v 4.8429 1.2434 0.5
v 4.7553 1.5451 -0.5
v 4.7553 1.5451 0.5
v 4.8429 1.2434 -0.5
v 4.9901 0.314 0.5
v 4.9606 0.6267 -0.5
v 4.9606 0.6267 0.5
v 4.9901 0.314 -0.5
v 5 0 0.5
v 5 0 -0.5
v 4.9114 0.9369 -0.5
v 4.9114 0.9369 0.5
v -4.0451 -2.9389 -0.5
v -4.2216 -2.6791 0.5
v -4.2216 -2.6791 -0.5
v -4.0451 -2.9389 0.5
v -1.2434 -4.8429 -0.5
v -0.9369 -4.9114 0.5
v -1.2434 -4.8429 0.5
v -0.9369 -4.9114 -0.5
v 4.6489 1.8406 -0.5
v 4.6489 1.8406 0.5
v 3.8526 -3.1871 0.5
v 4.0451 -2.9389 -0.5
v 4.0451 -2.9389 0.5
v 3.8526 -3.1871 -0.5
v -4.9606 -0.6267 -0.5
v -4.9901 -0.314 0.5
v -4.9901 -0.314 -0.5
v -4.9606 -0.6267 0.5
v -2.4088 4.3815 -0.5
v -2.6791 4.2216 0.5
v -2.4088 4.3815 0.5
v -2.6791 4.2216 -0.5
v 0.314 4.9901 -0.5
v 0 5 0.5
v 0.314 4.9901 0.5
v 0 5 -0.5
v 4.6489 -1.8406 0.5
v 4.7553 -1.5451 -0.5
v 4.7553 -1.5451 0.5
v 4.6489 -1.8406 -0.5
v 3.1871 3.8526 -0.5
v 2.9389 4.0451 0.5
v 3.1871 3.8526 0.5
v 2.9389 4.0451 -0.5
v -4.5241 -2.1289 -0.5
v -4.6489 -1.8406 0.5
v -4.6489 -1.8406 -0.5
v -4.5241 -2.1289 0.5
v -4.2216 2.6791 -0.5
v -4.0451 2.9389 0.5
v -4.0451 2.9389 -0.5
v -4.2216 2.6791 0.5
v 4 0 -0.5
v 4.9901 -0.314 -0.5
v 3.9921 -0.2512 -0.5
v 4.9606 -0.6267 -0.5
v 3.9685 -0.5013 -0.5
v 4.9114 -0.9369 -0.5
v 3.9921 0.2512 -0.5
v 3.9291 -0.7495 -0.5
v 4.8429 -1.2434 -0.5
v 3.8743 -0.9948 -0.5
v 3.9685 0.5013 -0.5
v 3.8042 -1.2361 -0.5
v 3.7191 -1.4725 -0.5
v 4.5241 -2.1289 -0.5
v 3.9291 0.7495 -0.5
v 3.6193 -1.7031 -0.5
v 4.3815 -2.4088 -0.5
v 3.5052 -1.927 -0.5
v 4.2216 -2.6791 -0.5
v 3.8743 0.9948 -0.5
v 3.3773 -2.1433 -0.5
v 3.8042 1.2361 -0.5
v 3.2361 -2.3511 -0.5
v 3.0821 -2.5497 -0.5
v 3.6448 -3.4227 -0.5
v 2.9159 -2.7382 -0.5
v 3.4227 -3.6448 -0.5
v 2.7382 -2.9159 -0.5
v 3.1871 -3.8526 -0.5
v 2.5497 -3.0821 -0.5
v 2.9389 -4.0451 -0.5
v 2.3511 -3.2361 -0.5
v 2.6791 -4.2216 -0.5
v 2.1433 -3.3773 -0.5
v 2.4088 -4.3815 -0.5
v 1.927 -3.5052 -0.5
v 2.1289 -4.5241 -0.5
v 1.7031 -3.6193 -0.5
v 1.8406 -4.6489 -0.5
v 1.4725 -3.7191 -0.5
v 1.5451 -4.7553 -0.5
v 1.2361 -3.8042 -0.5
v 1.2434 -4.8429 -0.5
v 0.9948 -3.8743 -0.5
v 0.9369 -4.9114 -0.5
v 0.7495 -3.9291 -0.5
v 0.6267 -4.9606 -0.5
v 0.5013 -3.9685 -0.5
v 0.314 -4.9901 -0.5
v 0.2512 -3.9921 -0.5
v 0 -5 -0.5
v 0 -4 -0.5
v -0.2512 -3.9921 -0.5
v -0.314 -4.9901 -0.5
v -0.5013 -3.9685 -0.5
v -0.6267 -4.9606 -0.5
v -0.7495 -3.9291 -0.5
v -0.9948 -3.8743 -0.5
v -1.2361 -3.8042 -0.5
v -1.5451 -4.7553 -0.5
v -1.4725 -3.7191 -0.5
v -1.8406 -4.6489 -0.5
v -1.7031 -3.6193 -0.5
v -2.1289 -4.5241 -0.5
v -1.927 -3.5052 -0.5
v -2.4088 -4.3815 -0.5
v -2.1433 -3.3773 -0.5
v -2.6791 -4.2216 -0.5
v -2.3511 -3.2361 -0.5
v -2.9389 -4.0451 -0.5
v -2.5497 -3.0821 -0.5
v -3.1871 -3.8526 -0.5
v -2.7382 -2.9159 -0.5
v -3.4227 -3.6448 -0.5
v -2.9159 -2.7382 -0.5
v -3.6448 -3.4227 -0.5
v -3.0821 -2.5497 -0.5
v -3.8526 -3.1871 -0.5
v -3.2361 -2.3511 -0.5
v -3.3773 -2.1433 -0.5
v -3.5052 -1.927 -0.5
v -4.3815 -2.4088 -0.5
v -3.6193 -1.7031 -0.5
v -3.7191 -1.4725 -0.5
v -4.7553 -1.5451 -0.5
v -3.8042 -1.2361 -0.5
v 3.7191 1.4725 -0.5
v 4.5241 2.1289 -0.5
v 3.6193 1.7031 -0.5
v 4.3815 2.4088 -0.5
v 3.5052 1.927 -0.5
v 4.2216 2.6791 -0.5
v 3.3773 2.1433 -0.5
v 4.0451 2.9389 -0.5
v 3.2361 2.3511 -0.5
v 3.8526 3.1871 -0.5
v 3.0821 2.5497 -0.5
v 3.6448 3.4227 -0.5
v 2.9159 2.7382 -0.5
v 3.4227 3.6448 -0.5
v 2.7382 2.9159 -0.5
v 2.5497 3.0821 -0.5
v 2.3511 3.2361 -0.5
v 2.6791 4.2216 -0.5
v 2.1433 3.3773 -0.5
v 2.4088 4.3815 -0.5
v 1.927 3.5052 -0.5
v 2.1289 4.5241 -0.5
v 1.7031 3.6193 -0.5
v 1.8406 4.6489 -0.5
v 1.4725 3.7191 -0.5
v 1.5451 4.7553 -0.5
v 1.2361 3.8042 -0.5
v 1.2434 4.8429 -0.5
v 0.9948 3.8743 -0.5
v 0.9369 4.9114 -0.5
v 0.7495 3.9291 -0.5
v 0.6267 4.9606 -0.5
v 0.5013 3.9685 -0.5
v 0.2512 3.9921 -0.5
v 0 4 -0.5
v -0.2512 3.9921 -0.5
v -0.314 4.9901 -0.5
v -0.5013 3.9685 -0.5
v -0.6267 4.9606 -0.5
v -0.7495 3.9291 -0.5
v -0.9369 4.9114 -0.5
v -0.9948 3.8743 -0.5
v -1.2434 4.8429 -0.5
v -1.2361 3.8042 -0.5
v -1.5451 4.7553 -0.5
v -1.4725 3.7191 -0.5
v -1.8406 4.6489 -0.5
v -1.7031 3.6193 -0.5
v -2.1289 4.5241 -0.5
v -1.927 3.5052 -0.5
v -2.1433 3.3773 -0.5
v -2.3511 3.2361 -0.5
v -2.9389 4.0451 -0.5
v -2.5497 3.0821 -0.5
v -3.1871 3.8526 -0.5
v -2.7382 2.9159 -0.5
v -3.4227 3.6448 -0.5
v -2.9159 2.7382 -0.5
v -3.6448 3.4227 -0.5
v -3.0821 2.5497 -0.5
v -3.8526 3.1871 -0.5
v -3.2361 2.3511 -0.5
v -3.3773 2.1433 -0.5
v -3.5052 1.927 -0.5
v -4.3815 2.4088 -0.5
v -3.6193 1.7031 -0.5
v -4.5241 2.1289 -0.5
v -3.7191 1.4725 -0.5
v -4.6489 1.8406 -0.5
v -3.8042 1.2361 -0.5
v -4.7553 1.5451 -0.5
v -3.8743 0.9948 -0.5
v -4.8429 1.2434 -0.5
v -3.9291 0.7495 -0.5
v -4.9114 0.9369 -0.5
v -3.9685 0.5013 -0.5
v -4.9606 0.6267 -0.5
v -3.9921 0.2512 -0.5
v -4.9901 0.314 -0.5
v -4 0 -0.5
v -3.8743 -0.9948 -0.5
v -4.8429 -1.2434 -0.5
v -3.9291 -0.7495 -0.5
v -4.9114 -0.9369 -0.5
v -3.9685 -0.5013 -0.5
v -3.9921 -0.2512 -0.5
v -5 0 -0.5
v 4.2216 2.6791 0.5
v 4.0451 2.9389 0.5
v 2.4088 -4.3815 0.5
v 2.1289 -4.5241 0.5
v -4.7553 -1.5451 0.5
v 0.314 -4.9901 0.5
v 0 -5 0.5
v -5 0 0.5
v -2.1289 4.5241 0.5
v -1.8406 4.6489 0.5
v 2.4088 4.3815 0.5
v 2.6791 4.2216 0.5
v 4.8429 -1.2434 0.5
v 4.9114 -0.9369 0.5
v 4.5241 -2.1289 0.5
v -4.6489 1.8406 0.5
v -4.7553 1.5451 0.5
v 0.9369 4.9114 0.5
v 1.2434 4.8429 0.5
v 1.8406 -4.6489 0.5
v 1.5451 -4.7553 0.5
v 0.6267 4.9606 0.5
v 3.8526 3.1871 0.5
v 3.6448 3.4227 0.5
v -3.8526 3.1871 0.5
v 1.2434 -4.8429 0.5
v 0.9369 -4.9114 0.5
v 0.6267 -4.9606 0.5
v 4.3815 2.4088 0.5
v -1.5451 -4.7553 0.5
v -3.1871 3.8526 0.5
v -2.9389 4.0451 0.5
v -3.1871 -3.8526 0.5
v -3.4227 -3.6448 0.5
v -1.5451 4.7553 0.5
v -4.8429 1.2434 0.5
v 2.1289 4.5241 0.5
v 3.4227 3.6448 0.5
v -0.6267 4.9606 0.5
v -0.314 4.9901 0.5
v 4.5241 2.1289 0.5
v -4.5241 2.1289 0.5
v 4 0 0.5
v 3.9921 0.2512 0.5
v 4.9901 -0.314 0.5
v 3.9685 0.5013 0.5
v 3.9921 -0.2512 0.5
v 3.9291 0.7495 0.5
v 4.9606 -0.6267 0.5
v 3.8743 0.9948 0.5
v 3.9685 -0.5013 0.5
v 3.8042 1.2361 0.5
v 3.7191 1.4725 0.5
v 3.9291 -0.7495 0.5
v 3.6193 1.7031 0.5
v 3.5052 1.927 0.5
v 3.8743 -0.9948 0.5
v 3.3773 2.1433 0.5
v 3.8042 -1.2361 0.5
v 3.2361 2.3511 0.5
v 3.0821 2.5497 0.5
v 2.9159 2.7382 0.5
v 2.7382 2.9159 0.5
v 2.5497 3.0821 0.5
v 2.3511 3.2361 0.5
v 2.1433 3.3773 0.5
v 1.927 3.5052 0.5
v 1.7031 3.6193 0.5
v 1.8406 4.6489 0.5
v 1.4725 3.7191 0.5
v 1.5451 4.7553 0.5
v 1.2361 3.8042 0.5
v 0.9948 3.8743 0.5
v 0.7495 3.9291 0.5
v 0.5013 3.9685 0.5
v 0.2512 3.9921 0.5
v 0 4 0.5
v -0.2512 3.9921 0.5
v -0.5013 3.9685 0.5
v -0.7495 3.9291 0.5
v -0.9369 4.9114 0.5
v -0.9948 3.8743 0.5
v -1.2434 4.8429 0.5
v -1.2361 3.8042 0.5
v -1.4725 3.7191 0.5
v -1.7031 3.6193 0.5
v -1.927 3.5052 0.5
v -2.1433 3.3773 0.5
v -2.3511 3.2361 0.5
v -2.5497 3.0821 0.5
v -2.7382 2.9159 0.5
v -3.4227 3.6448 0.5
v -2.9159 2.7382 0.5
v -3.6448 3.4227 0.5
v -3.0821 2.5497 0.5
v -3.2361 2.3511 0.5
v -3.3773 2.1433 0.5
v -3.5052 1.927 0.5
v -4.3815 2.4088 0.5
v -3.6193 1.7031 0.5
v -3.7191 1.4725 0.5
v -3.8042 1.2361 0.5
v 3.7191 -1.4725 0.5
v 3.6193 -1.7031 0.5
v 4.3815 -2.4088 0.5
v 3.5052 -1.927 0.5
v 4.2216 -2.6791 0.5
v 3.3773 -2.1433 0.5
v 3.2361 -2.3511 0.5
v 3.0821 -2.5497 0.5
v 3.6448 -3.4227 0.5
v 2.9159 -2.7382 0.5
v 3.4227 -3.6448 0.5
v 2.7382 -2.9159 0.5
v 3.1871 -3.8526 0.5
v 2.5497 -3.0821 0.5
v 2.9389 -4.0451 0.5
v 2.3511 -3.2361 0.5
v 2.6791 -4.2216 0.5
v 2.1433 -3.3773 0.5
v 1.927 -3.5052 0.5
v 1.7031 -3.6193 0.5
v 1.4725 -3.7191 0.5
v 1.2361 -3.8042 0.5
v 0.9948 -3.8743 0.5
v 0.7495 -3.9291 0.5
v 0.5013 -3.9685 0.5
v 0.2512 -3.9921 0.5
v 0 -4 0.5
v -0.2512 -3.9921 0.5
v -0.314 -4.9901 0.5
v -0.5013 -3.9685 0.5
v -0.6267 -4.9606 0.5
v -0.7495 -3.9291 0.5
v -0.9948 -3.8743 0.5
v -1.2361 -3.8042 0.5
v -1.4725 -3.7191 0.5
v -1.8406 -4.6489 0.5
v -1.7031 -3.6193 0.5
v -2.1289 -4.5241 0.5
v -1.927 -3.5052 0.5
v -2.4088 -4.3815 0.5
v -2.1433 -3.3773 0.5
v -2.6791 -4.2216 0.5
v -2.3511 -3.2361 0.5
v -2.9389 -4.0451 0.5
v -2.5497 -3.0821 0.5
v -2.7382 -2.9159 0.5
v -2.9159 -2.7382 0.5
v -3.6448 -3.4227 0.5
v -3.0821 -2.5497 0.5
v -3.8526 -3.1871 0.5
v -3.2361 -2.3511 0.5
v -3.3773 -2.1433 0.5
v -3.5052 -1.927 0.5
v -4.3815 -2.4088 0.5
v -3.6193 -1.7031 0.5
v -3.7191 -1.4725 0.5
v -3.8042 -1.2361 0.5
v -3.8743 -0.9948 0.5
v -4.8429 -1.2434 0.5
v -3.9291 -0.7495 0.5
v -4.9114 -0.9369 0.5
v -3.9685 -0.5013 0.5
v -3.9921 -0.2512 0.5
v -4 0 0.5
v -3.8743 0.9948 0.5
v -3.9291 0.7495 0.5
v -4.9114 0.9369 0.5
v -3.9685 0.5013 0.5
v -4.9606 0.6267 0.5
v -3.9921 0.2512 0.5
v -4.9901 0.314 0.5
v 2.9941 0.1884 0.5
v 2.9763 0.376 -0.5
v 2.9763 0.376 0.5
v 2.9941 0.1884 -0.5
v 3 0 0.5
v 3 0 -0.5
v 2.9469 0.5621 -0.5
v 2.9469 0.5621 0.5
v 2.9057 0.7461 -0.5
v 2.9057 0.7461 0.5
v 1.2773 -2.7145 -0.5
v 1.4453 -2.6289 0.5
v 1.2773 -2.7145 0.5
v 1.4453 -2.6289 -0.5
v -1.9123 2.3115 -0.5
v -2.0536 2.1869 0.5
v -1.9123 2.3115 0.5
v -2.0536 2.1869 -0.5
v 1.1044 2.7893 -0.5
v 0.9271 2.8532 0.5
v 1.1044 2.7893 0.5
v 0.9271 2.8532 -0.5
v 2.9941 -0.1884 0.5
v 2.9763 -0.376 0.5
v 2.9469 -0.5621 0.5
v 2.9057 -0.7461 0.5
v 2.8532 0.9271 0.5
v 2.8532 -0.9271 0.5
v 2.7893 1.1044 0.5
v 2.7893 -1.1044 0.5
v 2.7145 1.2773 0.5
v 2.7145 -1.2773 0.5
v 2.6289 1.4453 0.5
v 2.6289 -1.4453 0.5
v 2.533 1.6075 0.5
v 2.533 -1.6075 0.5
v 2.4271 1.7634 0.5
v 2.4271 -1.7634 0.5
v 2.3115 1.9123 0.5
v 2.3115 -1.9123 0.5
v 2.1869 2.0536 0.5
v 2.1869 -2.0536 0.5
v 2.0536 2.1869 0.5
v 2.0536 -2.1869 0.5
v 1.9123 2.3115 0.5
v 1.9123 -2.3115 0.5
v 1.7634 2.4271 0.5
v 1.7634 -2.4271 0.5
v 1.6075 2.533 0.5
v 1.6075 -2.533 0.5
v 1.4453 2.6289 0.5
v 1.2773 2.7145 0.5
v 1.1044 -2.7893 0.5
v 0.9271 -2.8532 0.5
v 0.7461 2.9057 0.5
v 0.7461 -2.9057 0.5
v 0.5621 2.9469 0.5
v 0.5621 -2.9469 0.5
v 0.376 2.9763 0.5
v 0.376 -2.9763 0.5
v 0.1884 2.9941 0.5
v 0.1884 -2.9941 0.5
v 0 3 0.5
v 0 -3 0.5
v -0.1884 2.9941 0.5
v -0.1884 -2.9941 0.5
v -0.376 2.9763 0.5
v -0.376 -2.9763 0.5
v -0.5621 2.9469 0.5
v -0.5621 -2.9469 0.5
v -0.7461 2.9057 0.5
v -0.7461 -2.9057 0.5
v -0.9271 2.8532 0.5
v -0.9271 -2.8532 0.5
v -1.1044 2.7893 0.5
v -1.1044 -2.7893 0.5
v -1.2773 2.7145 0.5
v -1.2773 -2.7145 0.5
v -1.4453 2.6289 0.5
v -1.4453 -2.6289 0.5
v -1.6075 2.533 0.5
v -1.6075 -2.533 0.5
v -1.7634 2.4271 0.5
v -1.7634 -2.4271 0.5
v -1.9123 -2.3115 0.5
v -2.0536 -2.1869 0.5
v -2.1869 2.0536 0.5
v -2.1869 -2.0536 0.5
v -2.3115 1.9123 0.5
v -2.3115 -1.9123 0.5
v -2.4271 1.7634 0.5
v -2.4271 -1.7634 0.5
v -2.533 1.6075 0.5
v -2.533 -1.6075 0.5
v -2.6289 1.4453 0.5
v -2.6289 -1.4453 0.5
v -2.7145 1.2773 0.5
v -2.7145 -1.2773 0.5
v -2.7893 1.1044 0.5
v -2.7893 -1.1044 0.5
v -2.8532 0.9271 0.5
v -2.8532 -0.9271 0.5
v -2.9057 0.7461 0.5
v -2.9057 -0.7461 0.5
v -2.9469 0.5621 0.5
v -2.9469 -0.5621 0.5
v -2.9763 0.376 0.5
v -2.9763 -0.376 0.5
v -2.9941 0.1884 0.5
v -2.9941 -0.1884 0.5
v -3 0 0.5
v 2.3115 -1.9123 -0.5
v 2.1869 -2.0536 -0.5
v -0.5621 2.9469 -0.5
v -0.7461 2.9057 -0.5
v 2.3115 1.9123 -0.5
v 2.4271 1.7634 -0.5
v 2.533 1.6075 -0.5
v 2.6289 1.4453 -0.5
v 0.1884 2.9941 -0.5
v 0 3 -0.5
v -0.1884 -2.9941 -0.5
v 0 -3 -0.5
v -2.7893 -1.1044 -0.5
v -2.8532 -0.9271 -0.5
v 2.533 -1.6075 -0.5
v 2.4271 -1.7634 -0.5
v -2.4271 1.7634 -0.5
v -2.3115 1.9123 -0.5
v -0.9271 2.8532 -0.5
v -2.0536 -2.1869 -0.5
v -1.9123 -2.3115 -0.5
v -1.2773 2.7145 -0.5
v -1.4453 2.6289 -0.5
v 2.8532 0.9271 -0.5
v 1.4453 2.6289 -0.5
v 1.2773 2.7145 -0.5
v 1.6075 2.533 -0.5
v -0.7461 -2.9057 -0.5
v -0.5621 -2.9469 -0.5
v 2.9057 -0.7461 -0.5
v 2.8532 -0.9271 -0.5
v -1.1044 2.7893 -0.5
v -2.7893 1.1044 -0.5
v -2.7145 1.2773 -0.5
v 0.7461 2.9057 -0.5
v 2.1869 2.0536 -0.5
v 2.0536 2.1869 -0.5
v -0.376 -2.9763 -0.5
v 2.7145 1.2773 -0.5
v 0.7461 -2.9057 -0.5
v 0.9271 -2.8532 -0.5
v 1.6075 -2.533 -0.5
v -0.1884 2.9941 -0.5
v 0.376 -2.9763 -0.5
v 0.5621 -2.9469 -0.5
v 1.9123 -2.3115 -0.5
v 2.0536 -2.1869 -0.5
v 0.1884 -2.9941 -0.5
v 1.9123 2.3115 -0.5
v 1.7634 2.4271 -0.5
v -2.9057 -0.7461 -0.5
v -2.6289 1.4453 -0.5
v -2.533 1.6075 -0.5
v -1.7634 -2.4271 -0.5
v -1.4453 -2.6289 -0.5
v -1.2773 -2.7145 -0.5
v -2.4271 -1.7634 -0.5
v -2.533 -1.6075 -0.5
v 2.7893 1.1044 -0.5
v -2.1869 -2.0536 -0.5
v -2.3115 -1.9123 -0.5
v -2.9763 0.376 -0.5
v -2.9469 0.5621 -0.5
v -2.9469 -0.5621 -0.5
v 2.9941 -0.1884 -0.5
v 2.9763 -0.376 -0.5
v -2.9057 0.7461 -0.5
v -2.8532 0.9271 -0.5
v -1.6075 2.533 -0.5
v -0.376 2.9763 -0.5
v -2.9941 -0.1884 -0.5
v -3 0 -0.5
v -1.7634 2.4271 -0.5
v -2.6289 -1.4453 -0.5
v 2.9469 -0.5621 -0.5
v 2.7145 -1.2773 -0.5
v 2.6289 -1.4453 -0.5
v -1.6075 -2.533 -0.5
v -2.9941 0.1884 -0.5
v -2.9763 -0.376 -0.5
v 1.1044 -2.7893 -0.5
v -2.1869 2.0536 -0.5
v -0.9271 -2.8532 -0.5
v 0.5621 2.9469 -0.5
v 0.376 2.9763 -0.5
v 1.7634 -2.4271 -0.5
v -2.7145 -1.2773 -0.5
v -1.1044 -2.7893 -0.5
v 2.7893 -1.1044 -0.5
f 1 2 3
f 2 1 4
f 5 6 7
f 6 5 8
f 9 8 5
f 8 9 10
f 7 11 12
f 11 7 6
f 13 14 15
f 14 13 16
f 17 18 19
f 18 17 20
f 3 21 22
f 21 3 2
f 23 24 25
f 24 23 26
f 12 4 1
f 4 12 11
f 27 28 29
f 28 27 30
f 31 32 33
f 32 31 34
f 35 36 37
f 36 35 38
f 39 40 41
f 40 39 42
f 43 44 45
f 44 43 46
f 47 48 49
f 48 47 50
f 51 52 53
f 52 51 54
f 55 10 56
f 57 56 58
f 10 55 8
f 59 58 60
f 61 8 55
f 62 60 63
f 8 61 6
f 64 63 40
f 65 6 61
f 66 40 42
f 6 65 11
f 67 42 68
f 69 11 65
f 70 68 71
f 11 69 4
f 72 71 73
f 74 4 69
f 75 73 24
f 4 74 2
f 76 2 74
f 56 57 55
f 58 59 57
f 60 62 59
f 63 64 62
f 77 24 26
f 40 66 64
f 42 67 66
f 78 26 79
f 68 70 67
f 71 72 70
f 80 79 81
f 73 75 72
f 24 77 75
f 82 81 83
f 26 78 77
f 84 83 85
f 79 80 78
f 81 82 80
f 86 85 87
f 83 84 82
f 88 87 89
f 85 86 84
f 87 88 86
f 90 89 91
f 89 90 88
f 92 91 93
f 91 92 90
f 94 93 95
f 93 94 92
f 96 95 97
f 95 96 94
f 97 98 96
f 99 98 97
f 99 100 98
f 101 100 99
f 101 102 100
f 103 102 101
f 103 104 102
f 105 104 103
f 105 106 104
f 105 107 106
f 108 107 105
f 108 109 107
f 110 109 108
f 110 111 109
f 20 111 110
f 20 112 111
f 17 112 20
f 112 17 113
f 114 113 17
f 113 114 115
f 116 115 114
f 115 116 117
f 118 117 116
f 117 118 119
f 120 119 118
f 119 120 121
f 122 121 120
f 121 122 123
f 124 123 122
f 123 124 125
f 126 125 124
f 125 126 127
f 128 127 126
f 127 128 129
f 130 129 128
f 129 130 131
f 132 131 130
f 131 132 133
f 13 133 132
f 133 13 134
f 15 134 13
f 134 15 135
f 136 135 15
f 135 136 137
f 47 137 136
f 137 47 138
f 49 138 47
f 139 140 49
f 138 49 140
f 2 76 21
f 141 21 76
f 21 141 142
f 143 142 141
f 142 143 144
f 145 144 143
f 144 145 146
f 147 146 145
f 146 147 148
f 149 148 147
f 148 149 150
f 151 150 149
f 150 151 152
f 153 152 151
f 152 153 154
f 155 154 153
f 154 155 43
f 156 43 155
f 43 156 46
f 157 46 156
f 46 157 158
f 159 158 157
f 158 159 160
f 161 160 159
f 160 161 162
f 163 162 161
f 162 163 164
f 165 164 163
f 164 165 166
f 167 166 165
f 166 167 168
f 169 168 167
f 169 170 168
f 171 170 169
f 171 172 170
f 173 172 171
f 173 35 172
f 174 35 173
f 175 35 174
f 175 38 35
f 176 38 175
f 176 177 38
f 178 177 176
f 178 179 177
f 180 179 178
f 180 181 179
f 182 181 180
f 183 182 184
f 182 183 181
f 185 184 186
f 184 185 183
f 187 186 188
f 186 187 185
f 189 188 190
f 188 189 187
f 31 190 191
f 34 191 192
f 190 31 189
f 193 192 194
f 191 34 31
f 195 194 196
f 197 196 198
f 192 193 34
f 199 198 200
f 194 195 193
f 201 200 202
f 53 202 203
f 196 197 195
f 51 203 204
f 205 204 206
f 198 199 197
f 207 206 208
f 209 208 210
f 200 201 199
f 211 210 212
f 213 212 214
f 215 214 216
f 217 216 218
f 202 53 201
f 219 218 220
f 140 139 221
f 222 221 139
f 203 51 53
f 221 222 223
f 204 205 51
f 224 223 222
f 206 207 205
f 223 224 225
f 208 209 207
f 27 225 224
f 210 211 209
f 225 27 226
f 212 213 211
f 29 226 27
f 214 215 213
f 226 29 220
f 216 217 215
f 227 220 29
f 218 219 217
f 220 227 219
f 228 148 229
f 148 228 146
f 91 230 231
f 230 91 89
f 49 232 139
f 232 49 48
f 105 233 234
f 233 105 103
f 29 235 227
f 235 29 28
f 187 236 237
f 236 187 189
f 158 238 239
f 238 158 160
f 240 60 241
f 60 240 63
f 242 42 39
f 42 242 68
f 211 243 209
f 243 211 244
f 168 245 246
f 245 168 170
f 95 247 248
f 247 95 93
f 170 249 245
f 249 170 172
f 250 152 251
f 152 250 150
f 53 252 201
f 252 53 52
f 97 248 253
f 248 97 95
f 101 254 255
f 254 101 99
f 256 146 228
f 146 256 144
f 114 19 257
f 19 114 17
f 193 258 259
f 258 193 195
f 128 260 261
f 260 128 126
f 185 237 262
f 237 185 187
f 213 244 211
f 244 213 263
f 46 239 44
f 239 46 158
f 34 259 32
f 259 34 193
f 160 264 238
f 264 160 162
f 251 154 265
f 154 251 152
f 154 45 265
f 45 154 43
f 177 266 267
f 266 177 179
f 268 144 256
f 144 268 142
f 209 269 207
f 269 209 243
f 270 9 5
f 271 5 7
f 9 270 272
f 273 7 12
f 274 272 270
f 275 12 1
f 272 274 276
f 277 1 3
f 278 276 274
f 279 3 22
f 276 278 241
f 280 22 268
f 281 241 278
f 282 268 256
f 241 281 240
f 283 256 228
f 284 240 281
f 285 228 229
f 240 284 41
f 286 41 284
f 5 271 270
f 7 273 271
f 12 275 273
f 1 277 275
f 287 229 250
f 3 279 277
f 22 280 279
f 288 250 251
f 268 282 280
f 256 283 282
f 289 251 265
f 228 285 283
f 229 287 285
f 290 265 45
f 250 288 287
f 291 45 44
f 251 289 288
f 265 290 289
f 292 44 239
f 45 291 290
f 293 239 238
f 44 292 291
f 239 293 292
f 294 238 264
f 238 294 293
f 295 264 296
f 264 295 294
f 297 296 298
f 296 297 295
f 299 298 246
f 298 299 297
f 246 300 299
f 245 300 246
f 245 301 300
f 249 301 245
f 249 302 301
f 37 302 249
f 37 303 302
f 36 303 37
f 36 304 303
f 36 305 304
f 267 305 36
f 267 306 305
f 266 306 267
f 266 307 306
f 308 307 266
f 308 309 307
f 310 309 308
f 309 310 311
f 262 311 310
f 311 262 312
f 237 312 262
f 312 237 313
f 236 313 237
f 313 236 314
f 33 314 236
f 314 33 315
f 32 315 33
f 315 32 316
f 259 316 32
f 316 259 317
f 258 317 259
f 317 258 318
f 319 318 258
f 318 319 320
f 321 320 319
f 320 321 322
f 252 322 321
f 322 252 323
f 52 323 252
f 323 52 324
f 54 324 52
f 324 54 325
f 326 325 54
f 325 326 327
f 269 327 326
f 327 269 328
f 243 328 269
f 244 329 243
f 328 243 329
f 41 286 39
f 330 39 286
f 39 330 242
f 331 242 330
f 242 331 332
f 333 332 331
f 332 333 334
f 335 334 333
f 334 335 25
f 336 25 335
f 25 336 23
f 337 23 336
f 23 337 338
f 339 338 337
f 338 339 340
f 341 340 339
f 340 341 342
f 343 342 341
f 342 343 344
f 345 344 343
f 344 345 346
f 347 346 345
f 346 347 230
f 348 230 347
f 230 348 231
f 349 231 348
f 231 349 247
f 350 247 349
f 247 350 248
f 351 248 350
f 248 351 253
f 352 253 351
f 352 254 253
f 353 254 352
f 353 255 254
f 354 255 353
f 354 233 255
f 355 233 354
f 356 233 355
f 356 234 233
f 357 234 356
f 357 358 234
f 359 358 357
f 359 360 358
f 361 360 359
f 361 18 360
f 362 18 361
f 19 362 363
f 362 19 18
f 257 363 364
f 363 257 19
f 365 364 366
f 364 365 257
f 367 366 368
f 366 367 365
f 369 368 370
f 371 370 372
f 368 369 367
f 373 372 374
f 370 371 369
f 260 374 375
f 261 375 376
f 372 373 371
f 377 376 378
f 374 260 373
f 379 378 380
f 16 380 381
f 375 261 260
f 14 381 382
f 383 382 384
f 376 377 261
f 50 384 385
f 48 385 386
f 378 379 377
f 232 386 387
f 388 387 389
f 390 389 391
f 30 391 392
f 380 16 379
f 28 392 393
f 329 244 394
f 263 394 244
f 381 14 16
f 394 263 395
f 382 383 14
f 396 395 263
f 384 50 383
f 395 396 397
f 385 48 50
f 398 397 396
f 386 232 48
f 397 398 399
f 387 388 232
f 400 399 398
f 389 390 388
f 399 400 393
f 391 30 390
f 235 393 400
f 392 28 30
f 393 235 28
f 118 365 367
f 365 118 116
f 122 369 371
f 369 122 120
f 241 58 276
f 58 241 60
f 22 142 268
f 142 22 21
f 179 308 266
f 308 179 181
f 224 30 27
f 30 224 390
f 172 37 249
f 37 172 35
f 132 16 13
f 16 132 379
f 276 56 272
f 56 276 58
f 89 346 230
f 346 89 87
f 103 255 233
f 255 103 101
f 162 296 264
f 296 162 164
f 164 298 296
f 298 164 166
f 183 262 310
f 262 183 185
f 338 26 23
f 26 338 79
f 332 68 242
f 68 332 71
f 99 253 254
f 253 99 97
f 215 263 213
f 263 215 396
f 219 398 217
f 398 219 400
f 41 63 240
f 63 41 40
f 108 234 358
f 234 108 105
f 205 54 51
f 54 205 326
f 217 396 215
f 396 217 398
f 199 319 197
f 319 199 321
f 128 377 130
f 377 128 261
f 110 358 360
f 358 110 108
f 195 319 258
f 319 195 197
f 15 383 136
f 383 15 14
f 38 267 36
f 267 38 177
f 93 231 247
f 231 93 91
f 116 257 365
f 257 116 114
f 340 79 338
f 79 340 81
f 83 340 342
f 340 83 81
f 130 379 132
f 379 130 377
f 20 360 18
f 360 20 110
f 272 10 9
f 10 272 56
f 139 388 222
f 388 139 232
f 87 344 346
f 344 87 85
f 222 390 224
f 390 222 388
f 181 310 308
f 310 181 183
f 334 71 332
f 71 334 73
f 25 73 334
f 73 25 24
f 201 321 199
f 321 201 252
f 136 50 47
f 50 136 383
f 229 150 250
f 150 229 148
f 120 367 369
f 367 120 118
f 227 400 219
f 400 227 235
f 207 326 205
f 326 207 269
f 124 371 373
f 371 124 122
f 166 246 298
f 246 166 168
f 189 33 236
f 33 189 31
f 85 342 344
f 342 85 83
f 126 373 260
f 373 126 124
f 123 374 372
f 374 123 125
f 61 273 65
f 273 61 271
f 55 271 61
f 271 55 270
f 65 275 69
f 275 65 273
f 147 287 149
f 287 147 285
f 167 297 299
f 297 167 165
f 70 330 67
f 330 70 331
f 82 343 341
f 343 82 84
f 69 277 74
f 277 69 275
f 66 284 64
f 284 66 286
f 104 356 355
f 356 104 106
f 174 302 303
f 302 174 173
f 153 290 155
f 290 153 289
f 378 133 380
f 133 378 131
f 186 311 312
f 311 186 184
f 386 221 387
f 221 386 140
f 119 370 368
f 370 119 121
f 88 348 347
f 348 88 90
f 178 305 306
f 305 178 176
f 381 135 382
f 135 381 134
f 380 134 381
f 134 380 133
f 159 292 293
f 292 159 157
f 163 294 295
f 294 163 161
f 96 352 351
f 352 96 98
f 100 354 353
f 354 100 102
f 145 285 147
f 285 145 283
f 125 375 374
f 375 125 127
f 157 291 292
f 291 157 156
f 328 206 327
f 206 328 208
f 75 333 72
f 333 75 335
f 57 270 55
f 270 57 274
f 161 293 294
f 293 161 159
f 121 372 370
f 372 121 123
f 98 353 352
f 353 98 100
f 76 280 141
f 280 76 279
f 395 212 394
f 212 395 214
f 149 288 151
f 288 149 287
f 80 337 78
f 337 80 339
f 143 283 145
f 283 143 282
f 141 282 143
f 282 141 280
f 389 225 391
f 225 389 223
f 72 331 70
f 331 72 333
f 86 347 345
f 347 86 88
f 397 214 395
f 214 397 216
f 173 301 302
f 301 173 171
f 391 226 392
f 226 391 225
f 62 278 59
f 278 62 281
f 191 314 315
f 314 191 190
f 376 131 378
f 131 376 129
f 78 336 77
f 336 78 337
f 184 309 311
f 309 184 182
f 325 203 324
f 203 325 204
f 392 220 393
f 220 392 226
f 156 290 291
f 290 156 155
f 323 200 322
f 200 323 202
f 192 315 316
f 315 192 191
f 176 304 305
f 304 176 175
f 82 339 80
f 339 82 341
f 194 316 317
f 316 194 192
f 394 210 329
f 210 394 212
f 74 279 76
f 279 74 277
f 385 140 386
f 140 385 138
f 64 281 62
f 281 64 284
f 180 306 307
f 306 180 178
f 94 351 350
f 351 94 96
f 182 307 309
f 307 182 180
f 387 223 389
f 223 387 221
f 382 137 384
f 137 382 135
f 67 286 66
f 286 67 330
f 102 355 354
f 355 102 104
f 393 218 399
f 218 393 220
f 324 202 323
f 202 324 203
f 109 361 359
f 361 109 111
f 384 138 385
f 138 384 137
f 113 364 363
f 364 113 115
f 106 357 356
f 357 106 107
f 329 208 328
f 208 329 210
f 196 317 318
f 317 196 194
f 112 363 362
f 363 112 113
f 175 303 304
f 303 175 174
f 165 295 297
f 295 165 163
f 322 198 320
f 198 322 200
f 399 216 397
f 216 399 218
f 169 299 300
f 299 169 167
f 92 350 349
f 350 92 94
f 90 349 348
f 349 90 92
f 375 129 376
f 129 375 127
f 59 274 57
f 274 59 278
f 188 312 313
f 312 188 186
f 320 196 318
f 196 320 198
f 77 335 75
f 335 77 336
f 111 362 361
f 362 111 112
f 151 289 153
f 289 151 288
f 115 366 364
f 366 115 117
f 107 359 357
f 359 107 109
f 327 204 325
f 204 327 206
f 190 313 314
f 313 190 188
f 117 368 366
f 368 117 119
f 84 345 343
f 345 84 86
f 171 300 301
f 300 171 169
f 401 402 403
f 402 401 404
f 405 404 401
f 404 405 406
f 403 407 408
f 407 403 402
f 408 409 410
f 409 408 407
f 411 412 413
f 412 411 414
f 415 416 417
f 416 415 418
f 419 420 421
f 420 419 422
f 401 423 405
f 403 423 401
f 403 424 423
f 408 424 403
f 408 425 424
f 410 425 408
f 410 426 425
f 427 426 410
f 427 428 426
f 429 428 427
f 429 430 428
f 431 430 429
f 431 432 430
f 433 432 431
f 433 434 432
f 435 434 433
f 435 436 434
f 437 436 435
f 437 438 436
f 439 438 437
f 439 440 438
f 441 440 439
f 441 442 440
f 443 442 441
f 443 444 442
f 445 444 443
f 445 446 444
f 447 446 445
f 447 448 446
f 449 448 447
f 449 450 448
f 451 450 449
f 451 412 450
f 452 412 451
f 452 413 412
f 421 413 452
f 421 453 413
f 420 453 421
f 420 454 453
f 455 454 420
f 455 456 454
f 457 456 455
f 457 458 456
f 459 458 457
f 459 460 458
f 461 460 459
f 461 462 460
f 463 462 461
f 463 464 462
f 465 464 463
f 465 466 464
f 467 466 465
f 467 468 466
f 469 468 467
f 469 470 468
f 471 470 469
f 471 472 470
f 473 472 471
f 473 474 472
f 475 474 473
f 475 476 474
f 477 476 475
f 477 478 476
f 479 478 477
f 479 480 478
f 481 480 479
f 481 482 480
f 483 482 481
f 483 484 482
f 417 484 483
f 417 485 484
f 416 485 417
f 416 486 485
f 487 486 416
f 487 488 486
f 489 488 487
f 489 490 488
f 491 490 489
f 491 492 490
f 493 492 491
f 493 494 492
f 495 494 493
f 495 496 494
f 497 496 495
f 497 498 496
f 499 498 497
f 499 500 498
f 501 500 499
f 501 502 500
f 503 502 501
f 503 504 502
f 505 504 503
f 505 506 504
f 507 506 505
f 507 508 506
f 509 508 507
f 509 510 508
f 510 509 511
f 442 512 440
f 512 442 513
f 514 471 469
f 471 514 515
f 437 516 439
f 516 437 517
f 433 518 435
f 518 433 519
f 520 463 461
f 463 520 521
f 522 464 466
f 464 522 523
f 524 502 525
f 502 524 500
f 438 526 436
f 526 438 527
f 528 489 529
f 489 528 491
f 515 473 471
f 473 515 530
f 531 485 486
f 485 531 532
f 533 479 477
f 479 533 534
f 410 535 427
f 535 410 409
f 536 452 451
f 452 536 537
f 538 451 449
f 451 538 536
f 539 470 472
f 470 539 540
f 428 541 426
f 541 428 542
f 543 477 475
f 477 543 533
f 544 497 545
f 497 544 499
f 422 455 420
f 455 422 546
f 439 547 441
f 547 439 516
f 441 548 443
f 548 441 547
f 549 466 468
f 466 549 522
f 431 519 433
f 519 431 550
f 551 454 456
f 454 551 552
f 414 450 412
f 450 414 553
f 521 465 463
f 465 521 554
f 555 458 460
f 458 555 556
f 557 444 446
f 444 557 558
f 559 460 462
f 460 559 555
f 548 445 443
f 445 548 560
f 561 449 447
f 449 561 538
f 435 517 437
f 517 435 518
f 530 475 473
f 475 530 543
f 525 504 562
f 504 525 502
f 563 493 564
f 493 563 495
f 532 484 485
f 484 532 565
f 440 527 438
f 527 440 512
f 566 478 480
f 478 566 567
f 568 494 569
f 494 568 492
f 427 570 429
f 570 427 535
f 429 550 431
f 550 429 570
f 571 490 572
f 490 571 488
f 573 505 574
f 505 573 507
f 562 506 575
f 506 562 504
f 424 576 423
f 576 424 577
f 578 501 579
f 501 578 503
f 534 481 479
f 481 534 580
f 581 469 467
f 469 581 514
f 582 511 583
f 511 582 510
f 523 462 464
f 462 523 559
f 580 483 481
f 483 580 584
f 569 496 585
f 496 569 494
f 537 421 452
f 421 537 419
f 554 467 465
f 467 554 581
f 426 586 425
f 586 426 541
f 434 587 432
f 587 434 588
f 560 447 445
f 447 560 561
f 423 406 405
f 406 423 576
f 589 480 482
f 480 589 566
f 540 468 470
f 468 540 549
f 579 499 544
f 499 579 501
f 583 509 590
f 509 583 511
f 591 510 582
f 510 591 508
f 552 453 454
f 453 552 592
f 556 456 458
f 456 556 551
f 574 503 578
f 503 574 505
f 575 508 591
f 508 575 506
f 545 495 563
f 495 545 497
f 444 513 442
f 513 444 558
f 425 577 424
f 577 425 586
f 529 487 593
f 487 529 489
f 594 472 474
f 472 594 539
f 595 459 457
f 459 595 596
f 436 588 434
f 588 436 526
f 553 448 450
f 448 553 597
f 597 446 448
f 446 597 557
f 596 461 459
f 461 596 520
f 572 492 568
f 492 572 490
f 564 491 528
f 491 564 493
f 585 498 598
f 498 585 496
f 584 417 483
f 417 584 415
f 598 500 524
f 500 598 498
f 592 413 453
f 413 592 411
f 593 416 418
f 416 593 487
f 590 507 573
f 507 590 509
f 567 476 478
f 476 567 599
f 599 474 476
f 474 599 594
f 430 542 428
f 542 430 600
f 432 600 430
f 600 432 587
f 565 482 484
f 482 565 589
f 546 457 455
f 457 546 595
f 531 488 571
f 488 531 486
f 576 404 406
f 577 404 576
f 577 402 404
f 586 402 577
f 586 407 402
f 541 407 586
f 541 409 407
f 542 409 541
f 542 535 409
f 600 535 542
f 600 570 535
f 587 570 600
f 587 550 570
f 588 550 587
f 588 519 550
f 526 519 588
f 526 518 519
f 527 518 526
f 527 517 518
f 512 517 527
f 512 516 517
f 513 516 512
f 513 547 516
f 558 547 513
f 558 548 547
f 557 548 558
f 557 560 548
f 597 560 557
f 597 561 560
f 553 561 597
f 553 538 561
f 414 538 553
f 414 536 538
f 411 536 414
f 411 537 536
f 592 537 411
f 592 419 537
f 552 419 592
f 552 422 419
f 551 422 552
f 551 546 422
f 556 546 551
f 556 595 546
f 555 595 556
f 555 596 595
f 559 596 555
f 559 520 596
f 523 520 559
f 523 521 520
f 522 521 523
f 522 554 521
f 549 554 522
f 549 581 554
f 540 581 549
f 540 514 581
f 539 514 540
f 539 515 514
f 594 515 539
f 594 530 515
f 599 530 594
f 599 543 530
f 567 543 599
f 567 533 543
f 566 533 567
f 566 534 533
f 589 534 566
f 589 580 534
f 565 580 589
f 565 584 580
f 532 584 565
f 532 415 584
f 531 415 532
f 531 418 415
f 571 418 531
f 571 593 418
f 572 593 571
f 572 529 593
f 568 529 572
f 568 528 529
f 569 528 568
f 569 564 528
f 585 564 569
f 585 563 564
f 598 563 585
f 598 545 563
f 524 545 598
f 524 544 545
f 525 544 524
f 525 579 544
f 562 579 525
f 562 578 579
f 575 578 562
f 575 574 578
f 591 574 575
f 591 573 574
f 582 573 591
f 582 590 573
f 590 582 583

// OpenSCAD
echo(version=version());

r=65; //Radius of circle

difference() {
    cylinder (h = 1, r=5, center = true, $fn=100);
    union(){
        color("red") cylinder(h = 2, r=4, center = true, $fn=100);
        for(i=[0:20:360]) rotate([0,0,i]) color ("red") square([0.5,17], center=true);
    }
}

difference(){
    cylinder (h=1, r=3, center=true, $fn=100);
    union(){
        for(i=[0:20:360]) rotate([0,0,i]) color ("red") square([0.5,17], center=true);
    }
}
